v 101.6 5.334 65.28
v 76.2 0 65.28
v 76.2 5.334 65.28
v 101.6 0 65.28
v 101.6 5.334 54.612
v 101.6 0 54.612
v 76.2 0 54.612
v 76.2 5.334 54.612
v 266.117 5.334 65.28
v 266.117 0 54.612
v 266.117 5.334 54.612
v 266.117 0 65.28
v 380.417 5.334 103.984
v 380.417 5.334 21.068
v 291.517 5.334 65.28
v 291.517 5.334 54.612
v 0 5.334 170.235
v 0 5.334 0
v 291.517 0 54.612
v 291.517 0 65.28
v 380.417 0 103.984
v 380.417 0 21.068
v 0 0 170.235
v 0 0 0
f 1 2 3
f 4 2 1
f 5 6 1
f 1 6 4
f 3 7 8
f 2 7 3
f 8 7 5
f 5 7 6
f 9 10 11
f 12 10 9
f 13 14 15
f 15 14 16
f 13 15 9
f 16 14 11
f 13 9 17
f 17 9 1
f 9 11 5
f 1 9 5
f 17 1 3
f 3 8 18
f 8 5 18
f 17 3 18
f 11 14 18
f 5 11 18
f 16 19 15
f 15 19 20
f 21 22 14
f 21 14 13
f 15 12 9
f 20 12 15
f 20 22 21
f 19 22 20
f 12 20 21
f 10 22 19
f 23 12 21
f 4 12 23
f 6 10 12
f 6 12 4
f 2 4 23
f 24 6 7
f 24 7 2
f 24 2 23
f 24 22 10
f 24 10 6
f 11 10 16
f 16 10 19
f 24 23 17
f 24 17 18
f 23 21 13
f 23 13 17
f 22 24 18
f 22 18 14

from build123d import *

# Parameters (mm, degrees)
BASE_DEPTH         = 5.334
CUT_EXTRUDE1_REACH = 7.334
SKETCH3_W          = 25.4
SKETCH3_H          = 10.668


with BuildPart() as part:
    # Sketch1 → Base (new body)
    with BuildSketch(Plane(origin=(0, 0, 0), x_dir=(1, 0, 0), z_dir=(0, 1, 0))):
        Polygon((0, 0), (380.417035208, -21.068443786), (380.417035208, -103.983742074), (0, -170.235385513), align=None)
    extrude(amount=BASE_DEPTH)

    # Sketch3 → Cut-Extrude1 (cut, up to next)
    with BuildSketch(Plane.XZ, mode=Mode.PRIVATE) as cut_extrude1_sk1:
        with Locations((278.817035208, 59.945526857)):
            Rectangle(SKETCH3_W, SKETCH3_H)
    cut_extrude1_tool1 = extrude(cut_extrude1_sk1.sketch, amount=-CUT_EXTRUDE1_REACH, mode=Mode.PRIVATE) & part.part
    add(cut_extrude1_tool1.solids().sort_by_distance((278.817035, 0, 59.945527))[0], mode=Mode.SUBTRACT)
    # Sketch3 → Cut-Extrude1 (cut, up to next)
    with BuildSketch(Plane.XZ, mode=Mode.PRIVATE) as cut_extrude1_sk2:
        with Locations((88.9, 59.945526857)):
            Rectangle(SKETCH3_W, SKETCH3_H)
    cut_extrude1_tool2 = extrude(cut_extrude1_sk2.sketch, amount=-CUT_EXTRUDE1_REACH, mode=Mode.PRIVATE) & part.part
    add(cut_extrude1_tool2.solids().sort_by_distance((88.9, 0, 59.945527))[0], mode=Mode.SUBTRACT)


solid = part.part
